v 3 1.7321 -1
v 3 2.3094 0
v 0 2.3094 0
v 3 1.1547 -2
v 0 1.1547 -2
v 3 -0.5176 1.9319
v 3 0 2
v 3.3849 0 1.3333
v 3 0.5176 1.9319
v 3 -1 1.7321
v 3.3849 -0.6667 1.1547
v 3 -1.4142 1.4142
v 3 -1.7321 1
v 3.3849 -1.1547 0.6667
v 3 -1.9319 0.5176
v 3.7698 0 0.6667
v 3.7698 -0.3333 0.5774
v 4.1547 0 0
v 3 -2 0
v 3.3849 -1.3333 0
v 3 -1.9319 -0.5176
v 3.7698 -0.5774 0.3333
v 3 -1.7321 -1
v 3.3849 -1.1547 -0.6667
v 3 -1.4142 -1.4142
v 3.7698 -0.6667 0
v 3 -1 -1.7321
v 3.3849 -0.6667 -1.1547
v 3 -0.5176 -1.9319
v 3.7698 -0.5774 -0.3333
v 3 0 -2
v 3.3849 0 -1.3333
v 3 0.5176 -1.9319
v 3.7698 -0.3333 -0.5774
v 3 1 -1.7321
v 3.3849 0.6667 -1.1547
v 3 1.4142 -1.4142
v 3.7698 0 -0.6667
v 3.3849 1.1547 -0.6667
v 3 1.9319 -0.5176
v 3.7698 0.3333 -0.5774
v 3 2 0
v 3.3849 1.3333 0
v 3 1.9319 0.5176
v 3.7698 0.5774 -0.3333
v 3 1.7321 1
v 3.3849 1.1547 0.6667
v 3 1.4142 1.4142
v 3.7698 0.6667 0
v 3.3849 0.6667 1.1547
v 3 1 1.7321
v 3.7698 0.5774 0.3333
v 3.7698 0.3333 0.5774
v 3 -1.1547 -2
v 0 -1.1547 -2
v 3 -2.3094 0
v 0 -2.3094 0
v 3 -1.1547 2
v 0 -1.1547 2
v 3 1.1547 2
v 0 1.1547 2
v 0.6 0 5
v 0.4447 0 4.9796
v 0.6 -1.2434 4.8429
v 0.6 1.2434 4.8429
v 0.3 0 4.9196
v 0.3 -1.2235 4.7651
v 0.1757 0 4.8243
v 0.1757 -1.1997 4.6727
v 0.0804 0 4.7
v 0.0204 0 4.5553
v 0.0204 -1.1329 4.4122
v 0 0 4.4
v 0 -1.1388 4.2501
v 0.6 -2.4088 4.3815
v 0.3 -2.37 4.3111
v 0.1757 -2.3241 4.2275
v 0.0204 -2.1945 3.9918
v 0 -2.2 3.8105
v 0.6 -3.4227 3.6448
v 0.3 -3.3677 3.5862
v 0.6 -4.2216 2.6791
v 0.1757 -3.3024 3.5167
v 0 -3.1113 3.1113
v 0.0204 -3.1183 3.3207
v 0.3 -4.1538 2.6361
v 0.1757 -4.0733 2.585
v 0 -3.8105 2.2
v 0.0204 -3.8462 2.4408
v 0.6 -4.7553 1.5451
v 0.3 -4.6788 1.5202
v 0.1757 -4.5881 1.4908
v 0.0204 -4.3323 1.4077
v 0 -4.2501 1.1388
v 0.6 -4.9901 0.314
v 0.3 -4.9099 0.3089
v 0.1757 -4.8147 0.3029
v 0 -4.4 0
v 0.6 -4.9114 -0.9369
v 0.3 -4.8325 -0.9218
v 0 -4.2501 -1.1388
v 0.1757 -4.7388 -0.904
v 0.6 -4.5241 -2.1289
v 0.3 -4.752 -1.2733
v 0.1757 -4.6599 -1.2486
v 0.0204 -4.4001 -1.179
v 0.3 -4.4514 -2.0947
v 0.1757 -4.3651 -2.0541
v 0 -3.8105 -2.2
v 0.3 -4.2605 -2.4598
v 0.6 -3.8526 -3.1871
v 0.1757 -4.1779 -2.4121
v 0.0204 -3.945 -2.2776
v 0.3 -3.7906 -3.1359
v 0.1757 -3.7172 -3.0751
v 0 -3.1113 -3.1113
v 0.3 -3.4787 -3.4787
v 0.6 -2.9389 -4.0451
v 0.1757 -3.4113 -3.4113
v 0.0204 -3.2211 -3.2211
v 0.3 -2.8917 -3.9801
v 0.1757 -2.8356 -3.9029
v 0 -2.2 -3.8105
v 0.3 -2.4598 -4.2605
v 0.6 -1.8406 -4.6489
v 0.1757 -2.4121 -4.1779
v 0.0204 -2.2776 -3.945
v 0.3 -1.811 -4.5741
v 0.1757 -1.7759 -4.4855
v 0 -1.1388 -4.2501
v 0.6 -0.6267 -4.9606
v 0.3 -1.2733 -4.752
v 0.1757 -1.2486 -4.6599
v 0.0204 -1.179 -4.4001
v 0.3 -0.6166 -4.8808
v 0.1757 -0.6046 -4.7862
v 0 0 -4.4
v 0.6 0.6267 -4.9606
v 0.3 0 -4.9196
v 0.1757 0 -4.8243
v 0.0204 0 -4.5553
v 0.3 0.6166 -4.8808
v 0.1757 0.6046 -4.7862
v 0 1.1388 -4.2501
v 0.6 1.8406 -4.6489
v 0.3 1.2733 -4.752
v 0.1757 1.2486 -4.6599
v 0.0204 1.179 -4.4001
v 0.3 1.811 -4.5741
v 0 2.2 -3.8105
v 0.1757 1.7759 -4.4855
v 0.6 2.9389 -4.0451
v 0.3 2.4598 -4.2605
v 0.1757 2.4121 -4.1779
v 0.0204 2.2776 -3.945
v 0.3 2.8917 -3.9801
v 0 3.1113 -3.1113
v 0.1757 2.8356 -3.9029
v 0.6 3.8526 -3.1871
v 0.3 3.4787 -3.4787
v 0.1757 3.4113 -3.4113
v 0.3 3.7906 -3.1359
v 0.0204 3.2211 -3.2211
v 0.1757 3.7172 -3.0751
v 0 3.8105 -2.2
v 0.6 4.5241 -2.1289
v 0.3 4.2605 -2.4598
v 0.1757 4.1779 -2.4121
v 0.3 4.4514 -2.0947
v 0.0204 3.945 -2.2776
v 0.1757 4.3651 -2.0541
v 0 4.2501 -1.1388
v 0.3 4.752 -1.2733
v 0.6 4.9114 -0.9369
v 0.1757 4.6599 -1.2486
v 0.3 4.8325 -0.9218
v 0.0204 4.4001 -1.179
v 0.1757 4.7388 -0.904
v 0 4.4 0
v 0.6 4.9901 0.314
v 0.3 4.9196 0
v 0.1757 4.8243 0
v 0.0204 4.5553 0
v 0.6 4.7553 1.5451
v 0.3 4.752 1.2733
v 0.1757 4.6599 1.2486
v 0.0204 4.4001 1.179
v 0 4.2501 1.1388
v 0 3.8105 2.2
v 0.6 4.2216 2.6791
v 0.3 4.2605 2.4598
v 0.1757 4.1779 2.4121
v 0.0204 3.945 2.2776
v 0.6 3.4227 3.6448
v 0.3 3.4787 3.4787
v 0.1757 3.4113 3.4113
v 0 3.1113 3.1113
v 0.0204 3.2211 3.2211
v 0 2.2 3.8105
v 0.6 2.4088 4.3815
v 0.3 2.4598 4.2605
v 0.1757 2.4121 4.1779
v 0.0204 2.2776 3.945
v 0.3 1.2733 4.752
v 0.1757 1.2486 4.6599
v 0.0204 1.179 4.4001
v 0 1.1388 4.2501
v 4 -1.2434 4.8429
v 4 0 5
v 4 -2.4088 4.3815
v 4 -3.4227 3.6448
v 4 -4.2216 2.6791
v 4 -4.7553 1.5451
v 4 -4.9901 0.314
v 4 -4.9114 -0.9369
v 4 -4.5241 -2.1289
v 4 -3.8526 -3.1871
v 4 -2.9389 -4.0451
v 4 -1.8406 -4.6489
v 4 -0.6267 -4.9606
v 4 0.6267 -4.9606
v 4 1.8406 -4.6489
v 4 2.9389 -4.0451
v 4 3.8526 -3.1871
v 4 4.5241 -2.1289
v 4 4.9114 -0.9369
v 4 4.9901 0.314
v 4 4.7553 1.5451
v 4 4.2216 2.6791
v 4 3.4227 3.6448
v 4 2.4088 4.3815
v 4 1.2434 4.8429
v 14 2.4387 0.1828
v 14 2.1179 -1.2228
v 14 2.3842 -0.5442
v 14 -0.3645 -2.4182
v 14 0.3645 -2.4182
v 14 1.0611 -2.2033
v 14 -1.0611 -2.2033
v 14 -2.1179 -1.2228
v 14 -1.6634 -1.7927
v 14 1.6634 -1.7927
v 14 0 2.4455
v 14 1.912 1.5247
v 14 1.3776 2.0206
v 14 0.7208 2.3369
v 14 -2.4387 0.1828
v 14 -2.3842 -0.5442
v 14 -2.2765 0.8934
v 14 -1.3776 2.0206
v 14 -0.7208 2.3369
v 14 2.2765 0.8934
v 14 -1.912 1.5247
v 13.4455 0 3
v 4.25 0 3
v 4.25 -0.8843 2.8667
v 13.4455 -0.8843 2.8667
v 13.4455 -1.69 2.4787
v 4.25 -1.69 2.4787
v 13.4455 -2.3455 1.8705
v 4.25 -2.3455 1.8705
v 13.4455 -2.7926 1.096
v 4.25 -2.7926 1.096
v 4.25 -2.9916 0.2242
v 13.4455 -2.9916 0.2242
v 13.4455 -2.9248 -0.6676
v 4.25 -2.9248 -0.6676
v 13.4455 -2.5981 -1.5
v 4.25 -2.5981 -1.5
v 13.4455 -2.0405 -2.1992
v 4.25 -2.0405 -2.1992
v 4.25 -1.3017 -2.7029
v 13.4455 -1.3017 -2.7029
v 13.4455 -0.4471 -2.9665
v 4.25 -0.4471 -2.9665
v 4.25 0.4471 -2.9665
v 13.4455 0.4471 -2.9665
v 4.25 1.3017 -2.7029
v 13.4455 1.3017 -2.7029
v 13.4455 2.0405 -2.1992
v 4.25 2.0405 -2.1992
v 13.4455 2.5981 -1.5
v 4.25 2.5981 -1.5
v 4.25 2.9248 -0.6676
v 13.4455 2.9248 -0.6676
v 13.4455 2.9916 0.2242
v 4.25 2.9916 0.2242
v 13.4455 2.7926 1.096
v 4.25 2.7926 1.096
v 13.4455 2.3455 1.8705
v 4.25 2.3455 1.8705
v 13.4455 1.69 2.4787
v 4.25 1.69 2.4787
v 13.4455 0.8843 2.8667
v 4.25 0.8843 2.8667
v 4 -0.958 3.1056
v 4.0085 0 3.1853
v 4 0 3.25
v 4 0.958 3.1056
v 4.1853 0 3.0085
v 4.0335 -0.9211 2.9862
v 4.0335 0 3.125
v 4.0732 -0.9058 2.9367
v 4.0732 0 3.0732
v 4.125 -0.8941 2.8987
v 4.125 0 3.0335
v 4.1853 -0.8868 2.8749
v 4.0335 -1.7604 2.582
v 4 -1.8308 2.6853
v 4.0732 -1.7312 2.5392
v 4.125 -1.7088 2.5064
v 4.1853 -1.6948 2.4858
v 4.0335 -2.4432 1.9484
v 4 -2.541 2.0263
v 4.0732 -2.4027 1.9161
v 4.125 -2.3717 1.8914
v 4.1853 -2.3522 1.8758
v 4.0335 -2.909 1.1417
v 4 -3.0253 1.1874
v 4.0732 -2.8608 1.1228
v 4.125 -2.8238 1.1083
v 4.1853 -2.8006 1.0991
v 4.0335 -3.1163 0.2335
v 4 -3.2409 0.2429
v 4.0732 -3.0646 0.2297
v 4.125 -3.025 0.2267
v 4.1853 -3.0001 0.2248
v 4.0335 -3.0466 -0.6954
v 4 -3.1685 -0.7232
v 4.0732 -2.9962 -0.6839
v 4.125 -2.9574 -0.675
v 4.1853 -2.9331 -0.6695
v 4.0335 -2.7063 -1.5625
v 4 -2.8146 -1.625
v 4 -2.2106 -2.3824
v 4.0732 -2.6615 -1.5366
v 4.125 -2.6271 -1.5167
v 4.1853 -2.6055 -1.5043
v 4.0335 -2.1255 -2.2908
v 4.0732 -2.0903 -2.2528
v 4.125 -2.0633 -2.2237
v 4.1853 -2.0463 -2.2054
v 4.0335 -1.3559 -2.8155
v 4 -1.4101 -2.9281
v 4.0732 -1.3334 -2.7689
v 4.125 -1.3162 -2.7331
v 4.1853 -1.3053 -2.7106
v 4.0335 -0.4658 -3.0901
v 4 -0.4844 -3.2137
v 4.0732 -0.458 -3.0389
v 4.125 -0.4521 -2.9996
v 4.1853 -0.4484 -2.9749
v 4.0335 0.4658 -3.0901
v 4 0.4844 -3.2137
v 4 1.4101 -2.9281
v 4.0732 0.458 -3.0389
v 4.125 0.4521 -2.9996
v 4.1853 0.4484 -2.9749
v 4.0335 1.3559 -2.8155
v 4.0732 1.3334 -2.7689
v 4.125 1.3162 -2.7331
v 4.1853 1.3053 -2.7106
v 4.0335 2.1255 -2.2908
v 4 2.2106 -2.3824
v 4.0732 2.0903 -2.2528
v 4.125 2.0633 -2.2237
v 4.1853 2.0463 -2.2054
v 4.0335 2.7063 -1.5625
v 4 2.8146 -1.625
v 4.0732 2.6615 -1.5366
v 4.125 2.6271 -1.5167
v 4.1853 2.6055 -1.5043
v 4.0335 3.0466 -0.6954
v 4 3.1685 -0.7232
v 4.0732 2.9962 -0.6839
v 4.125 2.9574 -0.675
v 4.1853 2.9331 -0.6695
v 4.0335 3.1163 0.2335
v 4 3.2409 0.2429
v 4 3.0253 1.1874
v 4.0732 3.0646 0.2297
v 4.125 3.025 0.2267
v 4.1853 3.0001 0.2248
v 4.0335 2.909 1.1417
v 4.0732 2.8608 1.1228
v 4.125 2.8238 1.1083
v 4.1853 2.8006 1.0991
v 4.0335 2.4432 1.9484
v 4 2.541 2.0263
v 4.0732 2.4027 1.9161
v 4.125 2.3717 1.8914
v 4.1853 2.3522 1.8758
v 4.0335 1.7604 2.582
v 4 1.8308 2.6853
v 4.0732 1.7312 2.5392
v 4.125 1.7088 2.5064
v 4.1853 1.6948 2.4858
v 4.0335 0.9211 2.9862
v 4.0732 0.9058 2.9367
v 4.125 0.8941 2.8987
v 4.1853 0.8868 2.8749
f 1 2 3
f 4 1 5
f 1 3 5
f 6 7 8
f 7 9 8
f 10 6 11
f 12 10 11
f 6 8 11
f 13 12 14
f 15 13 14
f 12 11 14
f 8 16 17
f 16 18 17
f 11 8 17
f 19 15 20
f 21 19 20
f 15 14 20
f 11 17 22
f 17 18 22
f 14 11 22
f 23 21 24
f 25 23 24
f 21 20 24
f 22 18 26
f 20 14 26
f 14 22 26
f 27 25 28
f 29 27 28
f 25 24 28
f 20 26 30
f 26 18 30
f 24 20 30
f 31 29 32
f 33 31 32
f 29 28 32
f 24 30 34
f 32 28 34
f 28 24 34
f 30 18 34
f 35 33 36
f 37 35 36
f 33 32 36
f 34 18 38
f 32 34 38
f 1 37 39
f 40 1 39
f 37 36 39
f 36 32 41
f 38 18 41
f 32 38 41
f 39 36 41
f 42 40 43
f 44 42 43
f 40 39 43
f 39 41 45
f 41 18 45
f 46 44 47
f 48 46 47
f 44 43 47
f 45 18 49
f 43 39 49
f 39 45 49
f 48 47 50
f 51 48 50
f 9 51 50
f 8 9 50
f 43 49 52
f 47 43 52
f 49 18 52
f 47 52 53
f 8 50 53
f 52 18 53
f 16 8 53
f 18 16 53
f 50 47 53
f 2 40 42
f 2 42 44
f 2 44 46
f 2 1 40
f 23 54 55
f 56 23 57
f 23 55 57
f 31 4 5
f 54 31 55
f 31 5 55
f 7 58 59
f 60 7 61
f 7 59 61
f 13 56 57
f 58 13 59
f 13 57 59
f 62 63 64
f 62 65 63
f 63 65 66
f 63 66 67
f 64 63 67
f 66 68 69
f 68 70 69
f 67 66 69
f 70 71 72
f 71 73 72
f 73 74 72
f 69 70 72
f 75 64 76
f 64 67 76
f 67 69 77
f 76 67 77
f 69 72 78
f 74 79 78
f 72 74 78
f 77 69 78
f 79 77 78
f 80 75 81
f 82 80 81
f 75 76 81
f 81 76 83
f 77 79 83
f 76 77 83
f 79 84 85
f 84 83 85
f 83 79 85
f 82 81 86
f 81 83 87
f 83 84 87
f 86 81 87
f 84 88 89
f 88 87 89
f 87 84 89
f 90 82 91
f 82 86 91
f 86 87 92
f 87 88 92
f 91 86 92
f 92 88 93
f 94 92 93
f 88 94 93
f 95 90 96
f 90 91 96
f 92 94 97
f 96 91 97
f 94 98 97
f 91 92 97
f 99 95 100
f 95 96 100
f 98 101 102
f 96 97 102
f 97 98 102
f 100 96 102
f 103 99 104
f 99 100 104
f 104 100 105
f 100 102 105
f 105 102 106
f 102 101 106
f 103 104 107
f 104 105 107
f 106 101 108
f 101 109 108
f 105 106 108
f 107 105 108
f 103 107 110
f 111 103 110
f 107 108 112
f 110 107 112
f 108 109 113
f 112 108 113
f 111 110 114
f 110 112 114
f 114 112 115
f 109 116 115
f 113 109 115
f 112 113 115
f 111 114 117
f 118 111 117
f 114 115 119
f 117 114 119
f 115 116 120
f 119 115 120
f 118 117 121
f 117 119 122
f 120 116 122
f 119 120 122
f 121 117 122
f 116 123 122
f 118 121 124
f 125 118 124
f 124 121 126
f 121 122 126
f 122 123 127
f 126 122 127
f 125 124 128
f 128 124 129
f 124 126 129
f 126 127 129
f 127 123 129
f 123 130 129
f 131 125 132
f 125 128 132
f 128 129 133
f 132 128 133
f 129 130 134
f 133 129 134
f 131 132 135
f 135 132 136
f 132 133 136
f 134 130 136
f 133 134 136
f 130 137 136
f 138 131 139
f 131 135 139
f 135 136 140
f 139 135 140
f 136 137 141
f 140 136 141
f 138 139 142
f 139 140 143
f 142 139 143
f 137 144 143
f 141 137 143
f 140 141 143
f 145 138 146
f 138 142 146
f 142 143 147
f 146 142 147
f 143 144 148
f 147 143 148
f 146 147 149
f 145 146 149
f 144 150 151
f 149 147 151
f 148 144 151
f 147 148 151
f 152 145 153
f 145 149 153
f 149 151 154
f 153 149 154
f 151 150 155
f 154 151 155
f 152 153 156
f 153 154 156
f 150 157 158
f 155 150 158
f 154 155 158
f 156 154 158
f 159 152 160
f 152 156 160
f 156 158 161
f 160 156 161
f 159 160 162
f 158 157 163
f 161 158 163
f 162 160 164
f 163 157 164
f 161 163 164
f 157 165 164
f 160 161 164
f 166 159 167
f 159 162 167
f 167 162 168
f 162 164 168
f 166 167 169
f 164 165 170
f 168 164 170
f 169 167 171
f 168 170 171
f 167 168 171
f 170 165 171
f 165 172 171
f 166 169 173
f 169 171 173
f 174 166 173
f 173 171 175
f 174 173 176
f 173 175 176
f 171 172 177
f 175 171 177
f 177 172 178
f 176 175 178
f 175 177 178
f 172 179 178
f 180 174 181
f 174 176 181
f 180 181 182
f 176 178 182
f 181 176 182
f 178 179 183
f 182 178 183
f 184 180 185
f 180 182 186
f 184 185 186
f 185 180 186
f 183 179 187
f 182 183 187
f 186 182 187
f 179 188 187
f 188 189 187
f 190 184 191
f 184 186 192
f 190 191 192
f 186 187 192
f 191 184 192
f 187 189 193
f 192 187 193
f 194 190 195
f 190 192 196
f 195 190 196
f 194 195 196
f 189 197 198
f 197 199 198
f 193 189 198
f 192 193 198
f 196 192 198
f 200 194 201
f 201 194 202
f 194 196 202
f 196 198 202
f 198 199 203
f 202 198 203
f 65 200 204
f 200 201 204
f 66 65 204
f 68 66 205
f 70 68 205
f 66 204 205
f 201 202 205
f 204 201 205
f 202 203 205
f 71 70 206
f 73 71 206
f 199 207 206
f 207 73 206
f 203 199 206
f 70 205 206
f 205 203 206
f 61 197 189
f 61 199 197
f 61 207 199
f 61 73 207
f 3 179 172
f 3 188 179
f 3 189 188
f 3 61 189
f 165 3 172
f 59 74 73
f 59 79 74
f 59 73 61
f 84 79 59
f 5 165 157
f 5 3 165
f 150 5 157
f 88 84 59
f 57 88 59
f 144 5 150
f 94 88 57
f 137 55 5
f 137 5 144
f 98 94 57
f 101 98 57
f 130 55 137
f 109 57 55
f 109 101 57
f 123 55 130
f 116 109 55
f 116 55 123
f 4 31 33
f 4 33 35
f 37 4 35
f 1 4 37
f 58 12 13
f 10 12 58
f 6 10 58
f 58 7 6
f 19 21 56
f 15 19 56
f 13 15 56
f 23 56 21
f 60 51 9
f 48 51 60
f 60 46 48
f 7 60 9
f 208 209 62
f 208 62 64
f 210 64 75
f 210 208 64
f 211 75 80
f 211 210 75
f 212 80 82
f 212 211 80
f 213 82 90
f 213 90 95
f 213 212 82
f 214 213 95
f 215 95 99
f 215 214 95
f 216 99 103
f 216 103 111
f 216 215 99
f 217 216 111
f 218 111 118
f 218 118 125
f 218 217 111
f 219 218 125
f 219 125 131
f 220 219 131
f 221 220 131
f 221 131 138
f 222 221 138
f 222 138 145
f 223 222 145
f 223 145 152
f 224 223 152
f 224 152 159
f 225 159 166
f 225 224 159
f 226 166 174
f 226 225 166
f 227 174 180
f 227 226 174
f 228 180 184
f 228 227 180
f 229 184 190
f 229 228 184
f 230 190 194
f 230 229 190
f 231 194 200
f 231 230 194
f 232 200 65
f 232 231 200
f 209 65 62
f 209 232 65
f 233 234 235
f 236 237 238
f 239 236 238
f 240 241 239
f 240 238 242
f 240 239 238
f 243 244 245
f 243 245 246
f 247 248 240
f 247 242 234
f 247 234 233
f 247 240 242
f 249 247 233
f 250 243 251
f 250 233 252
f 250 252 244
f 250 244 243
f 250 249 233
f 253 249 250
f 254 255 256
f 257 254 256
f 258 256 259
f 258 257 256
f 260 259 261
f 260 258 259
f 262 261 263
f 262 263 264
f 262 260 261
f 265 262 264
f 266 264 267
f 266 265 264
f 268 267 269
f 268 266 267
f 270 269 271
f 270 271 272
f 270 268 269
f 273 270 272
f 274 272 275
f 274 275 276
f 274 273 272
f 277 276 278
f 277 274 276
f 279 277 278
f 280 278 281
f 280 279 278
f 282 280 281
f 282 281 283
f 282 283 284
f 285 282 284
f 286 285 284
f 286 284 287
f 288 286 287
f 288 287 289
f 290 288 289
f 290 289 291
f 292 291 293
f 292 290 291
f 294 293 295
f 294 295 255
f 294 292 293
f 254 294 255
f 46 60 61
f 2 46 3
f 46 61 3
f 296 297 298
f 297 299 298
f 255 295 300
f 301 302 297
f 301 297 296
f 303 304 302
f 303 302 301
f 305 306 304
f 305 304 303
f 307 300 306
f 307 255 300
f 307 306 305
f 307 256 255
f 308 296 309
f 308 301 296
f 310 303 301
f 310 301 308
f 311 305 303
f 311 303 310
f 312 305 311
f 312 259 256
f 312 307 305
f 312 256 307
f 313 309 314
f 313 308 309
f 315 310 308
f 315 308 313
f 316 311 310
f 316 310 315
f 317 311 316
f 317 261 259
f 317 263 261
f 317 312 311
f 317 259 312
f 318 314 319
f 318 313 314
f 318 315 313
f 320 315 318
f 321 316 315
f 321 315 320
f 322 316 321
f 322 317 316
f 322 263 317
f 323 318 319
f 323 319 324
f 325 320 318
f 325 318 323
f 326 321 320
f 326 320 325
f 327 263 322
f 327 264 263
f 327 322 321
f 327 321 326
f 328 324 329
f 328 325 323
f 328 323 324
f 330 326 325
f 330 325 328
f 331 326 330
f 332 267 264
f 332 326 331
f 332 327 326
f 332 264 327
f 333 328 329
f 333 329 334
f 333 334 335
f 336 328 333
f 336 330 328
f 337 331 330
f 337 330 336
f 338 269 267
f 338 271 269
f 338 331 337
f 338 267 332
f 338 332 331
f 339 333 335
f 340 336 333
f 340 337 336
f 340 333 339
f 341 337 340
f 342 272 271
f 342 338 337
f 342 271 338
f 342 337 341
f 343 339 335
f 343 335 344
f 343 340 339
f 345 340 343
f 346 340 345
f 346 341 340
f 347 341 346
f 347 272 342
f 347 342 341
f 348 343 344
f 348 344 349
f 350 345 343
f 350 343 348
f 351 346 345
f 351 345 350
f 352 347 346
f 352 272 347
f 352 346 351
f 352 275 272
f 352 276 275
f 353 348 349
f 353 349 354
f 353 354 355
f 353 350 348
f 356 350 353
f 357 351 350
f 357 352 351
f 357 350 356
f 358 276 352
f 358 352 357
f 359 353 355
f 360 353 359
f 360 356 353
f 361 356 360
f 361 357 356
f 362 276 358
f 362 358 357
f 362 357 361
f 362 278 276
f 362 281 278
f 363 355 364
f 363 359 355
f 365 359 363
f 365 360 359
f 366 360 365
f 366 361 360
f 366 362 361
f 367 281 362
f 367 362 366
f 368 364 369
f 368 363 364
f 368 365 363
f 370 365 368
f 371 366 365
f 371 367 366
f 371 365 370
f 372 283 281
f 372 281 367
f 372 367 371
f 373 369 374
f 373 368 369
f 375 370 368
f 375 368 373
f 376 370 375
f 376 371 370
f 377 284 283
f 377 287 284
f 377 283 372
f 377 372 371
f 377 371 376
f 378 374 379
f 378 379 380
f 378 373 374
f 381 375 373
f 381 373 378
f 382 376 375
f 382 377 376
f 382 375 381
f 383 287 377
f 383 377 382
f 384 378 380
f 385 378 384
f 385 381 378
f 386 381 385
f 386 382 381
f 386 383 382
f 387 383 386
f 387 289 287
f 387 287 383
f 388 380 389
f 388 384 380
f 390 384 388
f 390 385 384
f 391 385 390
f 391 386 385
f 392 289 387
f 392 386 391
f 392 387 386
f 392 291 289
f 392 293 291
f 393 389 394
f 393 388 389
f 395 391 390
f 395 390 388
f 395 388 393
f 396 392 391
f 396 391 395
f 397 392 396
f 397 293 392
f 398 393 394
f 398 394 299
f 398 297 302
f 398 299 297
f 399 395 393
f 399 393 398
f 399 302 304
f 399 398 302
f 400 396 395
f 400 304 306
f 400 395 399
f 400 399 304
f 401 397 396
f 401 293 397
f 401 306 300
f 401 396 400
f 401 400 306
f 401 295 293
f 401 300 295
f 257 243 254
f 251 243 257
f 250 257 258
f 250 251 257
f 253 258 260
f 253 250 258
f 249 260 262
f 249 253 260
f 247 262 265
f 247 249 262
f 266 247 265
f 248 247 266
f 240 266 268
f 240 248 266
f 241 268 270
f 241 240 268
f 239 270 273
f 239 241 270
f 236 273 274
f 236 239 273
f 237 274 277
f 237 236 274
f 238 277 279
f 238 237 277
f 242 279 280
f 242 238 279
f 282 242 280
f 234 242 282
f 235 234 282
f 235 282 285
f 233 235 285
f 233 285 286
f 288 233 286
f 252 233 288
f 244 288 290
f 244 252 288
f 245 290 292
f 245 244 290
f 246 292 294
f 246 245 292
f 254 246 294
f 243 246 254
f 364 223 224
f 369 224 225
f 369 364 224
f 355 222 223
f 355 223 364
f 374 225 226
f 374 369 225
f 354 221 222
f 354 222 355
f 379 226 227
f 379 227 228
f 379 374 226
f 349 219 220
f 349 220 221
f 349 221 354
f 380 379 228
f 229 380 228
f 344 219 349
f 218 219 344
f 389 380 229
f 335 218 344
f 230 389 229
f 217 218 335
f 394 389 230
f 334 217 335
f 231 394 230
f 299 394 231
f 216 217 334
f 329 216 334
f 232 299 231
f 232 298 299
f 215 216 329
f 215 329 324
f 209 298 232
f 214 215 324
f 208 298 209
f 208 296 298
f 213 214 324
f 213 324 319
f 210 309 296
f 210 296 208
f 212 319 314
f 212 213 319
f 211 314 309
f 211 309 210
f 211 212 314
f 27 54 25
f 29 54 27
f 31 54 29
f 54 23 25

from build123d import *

# Parameters (mm, degrees)
FILLET1_R   = 0.25
FILLET2_R   = 0.6
HEX_2_DEPTH = 3


with BuildPart() as part:
    # BodySke → Base-Revolve (revolve)
    with BuildSketch(Plane.XY, mode=Mode.PRIVATE) as base_revolve_sk:
        Polygon((0, 0), (0, 5), (4, 5), (4, 3), (13.4455, 3), (14, 2.4455), (14, 0), align=None)
    revolve(base_revolve_sk.sketch.rotate(Axis((-31.75, 0, 0), (1, 0, 0)), 90), axis=Axis((-31.75, 0, 0), (1, 0, 0)))  # turned: the seam where the file's is

    # Fillet1
    fillet1_edges = [part.edges().sort_by_distance(p)[0] for p in [
        (4, 0, -3),
    ]]
    fillet(fillet1_edges, radius=FILLET1_R)

    # Fillet2
    fillet2_edges = [part.edges().sort_by_distance(p)[0] for p in [
        (0, 0, -5),
    ]]
    fillet(fillet2_edges, radius=FILLET2_R)

    # Sketch2 → Hex-PreBroach (revolve, cut)
    with BuildSketch(Plane.XY, mode=Mode.PRIVATE) as hex_prebroach_sk:
        Polygon((0, 2), (3, 2), (4.154700538, 0), (0, 0), align=None)
    revolve(hex_prebroach_sk.sketch.rotate(Axis((0, 0, 0), (1, 0, 0)), 90), axis=Axis((0, 0, 0), (1, 0, 0)), mode=Mode.SUBTRACT)  # turned: the seam where the file's is

    # Sketch3 → Hex 2 (cut)
    with BuildSketch(Plane(origin=(0, 0, 0), x_dir=(0, 0.5, 0.866025404), z_dir=(-1, 0, 0))):
        Polygon((1.154700538, 2), (-1.154700538, 2), (-2.309401077, 0), (-1.154700538, -2), (1.154700538, -2), (2.309401077, 0), align=None)
    extrude(amount=-HEX_2_DEPTH, mode=Mode.SUBTRACT)


solid = part.part
